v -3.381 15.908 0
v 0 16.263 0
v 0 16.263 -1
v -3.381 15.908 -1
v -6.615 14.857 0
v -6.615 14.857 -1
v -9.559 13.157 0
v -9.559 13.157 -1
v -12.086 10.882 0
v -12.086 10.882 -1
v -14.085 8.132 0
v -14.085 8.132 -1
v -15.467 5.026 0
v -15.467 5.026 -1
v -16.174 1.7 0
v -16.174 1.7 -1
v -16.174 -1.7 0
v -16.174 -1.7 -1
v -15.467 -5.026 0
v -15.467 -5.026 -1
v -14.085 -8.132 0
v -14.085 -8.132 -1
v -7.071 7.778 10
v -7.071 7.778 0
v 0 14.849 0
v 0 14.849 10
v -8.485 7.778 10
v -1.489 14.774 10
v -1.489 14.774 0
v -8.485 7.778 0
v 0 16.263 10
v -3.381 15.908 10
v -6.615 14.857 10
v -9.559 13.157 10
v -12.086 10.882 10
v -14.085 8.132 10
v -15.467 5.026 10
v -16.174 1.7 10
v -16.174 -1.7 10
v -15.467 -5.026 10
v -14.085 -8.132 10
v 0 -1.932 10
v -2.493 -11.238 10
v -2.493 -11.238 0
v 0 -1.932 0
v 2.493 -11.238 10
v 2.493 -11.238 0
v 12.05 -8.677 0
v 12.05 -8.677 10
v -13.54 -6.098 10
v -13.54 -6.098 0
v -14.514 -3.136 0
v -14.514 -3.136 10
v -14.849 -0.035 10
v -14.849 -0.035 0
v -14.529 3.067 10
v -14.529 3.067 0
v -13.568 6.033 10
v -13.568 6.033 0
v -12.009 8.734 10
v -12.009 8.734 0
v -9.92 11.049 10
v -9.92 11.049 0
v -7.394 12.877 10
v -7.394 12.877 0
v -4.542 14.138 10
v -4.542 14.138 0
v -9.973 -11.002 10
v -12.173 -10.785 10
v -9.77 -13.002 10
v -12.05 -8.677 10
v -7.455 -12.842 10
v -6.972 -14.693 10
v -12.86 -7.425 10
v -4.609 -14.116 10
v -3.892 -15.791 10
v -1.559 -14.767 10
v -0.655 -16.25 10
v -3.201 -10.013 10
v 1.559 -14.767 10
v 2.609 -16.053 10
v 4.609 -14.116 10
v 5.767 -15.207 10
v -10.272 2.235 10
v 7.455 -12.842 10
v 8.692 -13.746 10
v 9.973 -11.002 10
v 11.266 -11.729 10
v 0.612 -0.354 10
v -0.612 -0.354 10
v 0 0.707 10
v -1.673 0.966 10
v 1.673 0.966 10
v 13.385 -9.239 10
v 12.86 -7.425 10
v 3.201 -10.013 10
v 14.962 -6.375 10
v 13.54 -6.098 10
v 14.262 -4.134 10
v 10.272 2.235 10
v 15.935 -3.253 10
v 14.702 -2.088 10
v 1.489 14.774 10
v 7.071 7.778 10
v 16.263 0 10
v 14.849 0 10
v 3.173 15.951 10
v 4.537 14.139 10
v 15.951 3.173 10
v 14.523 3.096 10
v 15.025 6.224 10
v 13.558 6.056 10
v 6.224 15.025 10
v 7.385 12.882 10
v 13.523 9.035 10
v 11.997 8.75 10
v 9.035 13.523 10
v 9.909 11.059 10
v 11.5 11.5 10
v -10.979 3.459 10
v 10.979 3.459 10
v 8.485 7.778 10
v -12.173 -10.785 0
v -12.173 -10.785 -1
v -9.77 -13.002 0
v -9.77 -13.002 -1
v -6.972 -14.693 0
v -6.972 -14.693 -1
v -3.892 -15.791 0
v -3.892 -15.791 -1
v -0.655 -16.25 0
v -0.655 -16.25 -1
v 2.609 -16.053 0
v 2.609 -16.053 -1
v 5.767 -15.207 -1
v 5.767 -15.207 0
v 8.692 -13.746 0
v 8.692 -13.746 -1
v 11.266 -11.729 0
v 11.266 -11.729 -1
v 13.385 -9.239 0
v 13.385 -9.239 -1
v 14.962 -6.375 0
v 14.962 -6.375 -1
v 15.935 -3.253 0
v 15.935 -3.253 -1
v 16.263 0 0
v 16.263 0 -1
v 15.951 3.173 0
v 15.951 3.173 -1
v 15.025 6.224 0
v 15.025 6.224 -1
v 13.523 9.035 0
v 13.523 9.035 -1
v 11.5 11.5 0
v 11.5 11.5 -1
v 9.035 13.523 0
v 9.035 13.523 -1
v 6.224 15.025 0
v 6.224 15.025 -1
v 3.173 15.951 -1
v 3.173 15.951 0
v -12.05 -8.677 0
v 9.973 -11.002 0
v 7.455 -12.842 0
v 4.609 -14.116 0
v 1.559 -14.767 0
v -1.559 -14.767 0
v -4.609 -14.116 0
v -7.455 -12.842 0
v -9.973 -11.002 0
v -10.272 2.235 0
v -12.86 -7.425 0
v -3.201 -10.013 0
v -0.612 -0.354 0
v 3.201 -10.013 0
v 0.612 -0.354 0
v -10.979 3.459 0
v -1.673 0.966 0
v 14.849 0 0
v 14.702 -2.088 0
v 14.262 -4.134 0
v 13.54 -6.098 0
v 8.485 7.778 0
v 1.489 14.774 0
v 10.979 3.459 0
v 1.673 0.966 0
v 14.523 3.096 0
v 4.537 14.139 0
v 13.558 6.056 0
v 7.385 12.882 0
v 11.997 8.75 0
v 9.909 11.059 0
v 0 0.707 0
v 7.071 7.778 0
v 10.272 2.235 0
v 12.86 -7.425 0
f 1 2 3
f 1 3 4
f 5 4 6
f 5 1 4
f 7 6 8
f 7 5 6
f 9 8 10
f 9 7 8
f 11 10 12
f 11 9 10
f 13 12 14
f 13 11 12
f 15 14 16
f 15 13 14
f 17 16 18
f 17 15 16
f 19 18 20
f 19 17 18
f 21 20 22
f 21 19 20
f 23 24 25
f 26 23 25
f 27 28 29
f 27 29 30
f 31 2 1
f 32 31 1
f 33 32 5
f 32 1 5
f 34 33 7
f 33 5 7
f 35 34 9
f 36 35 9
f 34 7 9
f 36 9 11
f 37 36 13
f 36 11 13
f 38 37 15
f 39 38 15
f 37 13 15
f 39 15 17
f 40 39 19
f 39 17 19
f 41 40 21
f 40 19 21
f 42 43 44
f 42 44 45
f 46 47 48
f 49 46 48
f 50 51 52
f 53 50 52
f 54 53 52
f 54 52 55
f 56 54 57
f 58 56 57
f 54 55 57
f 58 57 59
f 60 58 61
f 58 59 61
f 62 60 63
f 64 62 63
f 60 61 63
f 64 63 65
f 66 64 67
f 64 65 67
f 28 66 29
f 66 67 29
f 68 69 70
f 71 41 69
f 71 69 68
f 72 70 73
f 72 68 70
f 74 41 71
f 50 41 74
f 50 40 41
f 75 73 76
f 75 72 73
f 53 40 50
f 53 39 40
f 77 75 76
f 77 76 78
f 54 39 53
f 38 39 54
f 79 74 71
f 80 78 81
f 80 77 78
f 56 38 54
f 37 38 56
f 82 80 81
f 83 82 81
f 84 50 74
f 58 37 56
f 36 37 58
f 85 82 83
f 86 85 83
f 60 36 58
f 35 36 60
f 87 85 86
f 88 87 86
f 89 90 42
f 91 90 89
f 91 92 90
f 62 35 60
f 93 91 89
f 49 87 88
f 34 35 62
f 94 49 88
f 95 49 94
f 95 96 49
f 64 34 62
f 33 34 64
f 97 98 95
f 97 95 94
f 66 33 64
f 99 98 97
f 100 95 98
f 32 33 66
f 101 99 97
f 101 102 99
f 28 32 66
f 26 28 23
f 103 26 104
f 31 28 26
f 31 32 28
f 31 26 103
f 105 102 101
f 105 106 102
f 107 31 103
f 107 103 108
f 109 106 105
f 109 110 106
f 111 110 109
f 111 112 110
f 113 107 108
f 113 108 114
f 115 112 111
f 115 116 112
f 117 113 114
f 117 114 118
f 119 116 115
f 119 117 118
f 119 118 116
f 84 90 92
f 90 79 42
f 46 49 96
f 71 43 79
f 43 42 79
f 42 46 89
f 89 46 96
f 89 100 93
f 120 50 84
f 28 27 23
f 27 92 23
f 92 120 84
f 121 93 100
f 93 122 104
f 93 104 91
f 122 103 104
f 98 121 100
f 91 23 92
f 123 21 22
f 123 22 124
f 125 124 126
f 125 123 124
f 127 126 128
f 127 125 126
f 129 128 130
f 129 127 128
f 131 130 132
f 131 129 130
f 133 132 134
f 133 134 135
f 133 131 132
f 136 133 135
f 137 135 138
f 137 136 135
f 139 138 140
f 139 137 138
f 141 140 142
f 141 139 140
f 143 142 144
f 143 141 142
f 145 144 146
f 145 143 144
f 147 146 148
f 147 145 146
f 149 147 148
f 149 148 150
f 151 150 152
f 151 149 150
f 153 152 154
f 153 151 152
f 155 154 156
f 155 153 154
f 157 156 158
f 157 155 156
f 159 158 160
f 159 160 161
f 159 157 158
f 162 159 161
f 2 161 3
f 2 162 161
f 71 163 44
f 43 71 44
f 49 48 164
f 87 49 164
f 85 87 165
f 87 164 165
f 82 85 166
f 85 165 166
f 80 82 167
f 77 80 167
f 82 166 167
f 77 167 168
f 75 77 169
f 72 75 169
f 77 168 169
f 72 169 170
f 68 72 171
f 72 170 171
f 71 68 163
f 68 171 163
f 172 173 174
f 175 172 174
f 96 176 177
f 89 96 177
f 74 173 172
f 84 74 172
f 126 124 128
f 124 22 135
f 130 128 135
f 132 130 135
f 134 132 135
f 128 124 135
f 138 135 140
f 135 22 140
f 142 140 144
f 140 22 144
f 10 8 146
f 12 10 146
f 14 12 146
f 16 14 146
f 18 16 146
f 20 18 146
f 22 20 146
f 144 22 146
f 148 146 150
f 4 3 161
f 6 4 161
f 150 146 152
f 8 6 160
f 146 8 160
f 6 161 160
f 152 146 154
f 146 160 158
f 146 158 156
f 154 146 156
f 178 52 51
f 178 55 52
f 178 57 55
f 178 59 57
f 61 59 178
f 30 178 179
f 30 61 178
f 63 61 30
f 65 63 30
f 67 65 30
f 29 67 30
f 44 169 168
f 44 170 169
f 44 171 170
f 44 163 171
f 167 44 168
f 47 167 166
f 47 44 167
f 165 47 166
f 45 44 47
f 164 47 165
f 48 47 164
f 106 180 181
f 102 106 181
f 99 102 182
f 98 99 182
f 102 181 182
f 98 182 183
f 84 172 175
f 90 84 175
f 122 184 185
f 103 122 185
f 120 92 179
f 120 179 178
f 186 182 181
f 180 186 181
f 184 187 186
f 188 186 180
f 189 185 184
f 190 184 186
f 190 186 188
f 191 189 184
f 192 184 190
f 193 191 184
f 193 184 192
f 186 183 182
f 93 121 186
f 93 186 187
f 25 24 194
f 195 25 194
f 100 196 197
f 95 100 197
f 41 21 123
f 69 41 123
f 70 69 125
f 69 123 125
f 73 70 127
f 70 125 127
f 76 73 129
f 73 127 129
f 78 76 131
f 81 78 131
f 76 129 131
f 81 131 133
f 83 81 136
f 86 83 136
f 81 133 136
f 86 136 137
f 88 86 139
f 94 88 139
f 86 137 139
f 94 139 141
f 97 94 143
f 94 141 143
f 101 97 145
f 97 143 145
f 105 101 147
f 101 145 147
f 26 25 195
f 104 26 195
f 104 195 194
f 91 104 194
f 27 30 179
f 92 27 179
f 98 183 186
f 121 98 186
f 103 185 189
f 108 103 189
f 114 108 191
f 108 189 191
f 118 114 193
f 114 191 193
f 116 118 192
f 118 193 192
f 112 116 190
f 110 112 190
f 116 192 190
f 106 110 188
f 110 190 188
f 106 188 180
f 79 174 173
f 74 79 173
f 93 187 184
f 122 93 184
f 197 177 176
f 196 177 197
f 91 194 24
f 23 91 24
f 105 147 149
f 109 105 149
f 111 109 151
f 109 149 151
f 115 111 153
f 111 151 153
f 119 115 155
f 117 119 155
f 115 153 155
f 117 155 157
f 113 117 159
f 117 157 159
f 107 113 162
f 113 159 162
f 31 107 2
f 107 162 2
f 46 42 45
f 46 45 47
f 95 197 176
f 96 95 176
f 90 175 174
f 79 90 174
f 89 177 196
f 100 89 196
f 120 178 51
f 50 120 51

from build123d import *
from build123d import SkipClean  # not in build123d's __all__

# Parameters (mm, degrees)
F1_DEPTH = 1
F2_DEPTH = 10


with BuildPart() as f1:
    # F0 (on Top) → F1 (new body)
    with BuildSketch(Plane.XY):
        with BuildLine():
            Line((10.9787374798, 3.4593819318), (1.6730326075, 0.9659258263))
            Line((1.6730326075, 0.9659258263), (0.4482877361, -0.2588190451))
            Line((0.4482877361, -0.2588190451), (0, -1.9318516526))
            Line((0, -1.9318516526), (2.4934561055, -11.2375565249))
            Line((2.4934561055, -11.2375565249), (12.0504683321, -8.6767628167))
            ThreePointArc((12.0504683321, -8.6767628167), (12.4708698642, -8.0608563335), (12.8598211496, -7.4246212025))
            ThreePointArc((12.8598211496, -7.4246212025), (13.2163412932, -6.769661943), (13.5395311879, -6.0976302947))
            Line((13.5395311879, -6.0976302947), (10.9787374798, 3.4593819318))
        make_face()
        Polygon((10.2716306986, 2.2346370604), (12.8598211496, -7.4246212025), (3.2005628867, -10.0128116535), (0.6123724357, -0.3535533906), align=None, mode=Mode.SUBTRACT)
        with BuildLine():
            ThreePointArc((1.4890628559, 14.7743931114), (0.7454714289, 14.8305182765), (0, 14.8492424049))
            ThreePointArc((0, 14.8492424049), (-0.7454714289, 14.8305182765), (-1.4890628559, 14.7743931114))
            Line((-1.4890628559, 14.7743931114), (-8.4852813742, 7.7781745931))
            Line((-8.4852813742, 7.7781745931), (-1.6730326075, 0.9659258263))
            Line((-1.6730326075, 0.9659258263), (0, 0.5176380902))
            Line((0, 0.5176380902), (1.6730326075, 0.9659258263))
            Line((1.6730326075, 0.9659258263), (8.4852813742, 7.7781745931))
            Line((8.4852813742, 7.7781745931), (1.4890628559, 14.7743931114))
        make_face()
        Polygon((-7.0710678119, 7.7781745931), (0, 14.8492424049), (7.0710678119, 7.7781745931), (0, 0.7071067812), align=None, mode=Mode.SUBTRACT)
        with BuildLine():
            Line((-10.9787374798, 3.4593819318), (-13.5395311879, -6.0976302947))
            ThreePointArc((-13.5395311879, -6.0976302947), (-13.2163412932, -6.769661943), (-12.8598211496, -7.4246212025))
            ThreePointArc((-12.8598211496, -7.4246212025), (-12.4708698642, -8.0608563335), (-12.0504683321, -8.6767628167))
            Line((-12.0504683321, -8.6767628167), (-2.4934561055, -11.2375565249))
            Line((-2.4934561055, -11.2375565249), (0, -1.9318516526))
            Line((0, -1.9318516526), (-0.4482877361, -0.2588190451))
            Line((-0.4482877361, -0.2588190451), (-1.6730326075, 0.9659258263))
            Line((-1.6730326075, 0.9659258263), (-10.9787374798, 3.4593819318))
        make_face()
        Polygon((-3.2005628867, -10.0128116535), (-12.8598211496, -7.4246212025), (-10.2716306986, 2.2346370604), (-0.6123724357, -0.3535533906), align=None, mode=Mode.SUBTRACT)
        Polygon((-10.2716306986, 2.2346370604), (-12.8598211496, -7.4246212025), (-3.2005628867, -10.0128116535), (-0.6123724357, -0.3535533906), align=None)
        Polygon((3.2005628867, -10.0128116535), (12.8598211496, -7.4246212025), (10.2716306986, 2.2346370604), (0.6123724357, -0.3535533906), align=None)
        Polygon((7.0710678119, 7.7781745931), (0, 14.8492424049), (-7.0710678119, 7.7781745931), (0, 0.7071067812), align=None)
        with BuildLine():
            Line((-8.4852813742, 7.7781745931), (-1.4890628559, 14.7743931114))
            ThreePointArc((-1.4890628559, 14.7743931114), (-12.8598211496, 7.4246212025), (-13.5395311879, -6.0976302947))
            Line((-13.5395311879, -6.0976302947), (-10.9787374798, 3.4593819318))
            Line((-10.9787374798, 3.4593819318), (-1.6730326075, 0.9659258263))
            Line((-1.6730326075, 0.9659258263), (-8.4852813742, 7.7781745931))
        make_face()
        with BuildLine():
            ThreePointArc((14.8492424049, 0), (11.0138879444, 9.9596321392), (1.4890628559, 14.7743931114))
            Line((1.4890628559, 14.7743931114), (8.4852813742, 7.7781745931))
            Line((8.4852813742, 7.7781745931), (1.6730326075, 0.9659258263))
            Line((1.6730326075, 0.9659258263), (10.9787374798, 3.4593819318))
            Line((10.9787374798, 3.4593819318), (13.5395311879, -6.0976302947))
            ThreePointArc((13.5395311879, -6.0976302947), (14.5181228239, -3.1183504727), (14.8492424049, 0))
        make_face()
        with BuildLine():
            Line((-2.4934561055, -11.2375565249), (-12.0504683321, -8.6767628167))
            ThreePointArc((-12.0504683321, -8.6767628167), (0, -14.8492424049), (12.0504683321, -8.6767628167))
            Line((12.0504683321, -8.6767628167), (2.4934561055, -11.2375565249))
            Line((2.4934561055, -11.2375565249), (0, -1.9318516526))
            Line((0, -1.9318516526), (-2.4934561055, -11.2375565249))
        make_face()
        with BuildLine():
            ThreePointArc((-13.5395311879, -6.0976302947), (-12.8598211496, 7.4246212025), (-1.4890628559, 14.7743931114))
            Line((-1.4890628559, 14.7743931114), (0, 16.2634559673))
            ThreePointArc((0, 16.2634559673), (-14.084566021, 8.1317279836), (-14.084566021, -8.1317279836))
            Line((-14.084566021, -8.1317279836), (-13.5395311879, -6.0976302947))
        make_face()
        with BuildLine():
            Line((0, 16.2634559673), (1.4890628559, 14.7743931114))
            ThreePointArc((1.4890628559, 14.7743931114), (11.0138879444, 9.9596321392), (14.8492424049, 0))
            ThreePointArc((14.8492424049, 0), (14.5181228239, -3.1183504727), (13.5395311879, -6.0976302947))
            Line((13.5395311879, -6.0976302947), (14.084566021, -8.1317279836))
            ThreePointArc((14.084566021, -8.1317279836), (15.7092921435, -4.2092921435), (16.2634559673, 0))
            ThreePointArc((16.2634559673, 0), (11.5, 11.5), (0, 16.2634559673))
        make_face()
        with BuildLine():
            Line((-12.0504683321, -8.6767628167), (-14.084566021, -8.1317279836))
            ThreePointArc((-14.084566021, -8.1317279836), (0, -16.2634559673), (14.084566021, -8.1317279836))
            Line((14.084566021, -8.1317279836), (12.0504683321, -8.6767628167))
            ThreePointArc((12.0504683321, -8.6767628167), (0, -14.8492424049), (-12.0504683321, -8.6767628167))
        make_face()
        with BuildLine():
            ThreePointArc((-1.4890628559, 14.7743931114), (-0.7454714289, 14.8305182765), (0, 14.8492424049))
            ThreePointArc((0, 14.8492424049), (0.7454714289, 14.8305182765), (1.4890628559, 14.7743931114))
            Line((1.4890628559, 14.7743931114), (0, 16.2634559673))
            Line((0, 16.2634559673), (-1.4890628559, 14.7743931114))
        make_face()
        with BuildLine():
            Line((14.084566021, -8.1317279836), (13.5395311879, -6.0976302947))
            ThreePointArc((13.5395311879, -6.0976302947), (13.2163412932, -6.769661943), (12.8598211496, -7.4246212025))
            ThreePointArc((12.8598211496, -7.4246212025), (12.4708698642, -8.0608563335), (12.0504683321, -8.6767628167))
            Line((12.0504683321, -8.6767628167), (14.084566021, -8.1317279836))
        make_face()
        with BuildLine():
            ThreePointArc((-12.8598211496, -7.4246212025), (-13.2163412932, -6.769661943), (-13.5395311879, -6.0976302947))
            Line((-13.5395311879, -6.0976302947), (-14.084566021, -8.1317279836))
            Line((-14.084566021, -8.1317279836), (-12.0504683321, -8.6767628167))
            ThreePointArc((-12.0504683321, -8.6767628167), (-12.4708698642, -8.0608563335), (-12.8598211496, -7.4246212025))
        make_face()
        Polygon((0, -0.7071067812), (0.4482877361, -0.2588190451), (0.6123724357, 0.3535533906), (0, 0.5176380902), (-0.6123724357, 0.3535533906), (-0.4482877361, -0.2588190451), align=None)
        Polygon((0, -1.9318516526), (0.4482877361, -0.2588190451), (0, -0.7071067812), (-0.4482877361, -0.2588190451), align=None)
        Polygon((0, 0.5176380902), (-1.6730326075, 0.9659258263), (-0.4482877361, -0.2588190451), (-0.6123724357, 0.3535533906), align=None)
        Polygon((0.4482877361, -0.2588190451), (1.6730326075, 0.9659258263), (0, 0.5176380902), (0.6123724357, 0.3535533906), align=None)
    extrude(amount=-F1_DEPTH)

    # F0 (on Top) → F2 (join)
    with BuildSketch(Plane.XY):
        with BuildLine():
            Line((10.9787374798, 3.4593819318), (1.6730326075, 0.9659258263))
            Line((1.6730326075, 0.9659258263), (0.4482877361, -0.2588190451))
            Line((0.4482877361, -0.2588190451), (0, -1.9318516526))
            Line((0, -1.9318516526), (2.4934561055, -11.2375565249))
            Line((2.4934561055, -11.2375565249), (12.0504683321, -8.6767628167))
            ThreePointArc((12.0504683321, -8.6767628167), (12.4708698642, -8.0608563335), (12.8598211496, -7.4246212025))
            ThreePointArc((12.8598211496, -7.4246212025), (13.2163412932, -6.769661943), (13.5395311879, -6.0976302947))
            Line((13.5395311879, -6.0976302947), (10.9787374798, 3.4593819318))
        make_face()
        Polygon((10.2716306986, 2.2346370604), (12.8598211496, -7.4246212025), (3.2005628867, -10.0128116535), (0.6123724357, -0.3535533906), align=None, mode=Mode.SUBTRACT)
        with BuildLine():
            Line((0, 16.2634559673), (1.4890628559, 14.7743931114))
            ThreePointArc((1.4890628559, 14.7743931114), (11.0138879444, 9.9596321392), (14.8492424049, 0))
            ThreePointArc((14.8492424049, 0), (14.5181228239, -3.1183504727), (13.5395311879, -6.0976302947))
            Line((13.5395311879, -6.0976302947), (14.084566021, -8.1317279836))
            ThreePointArc((14.084566021, -8.1317279836), (15.7092921435, -4.2092921435), (16.2634559673, 0))
            ThreePointArc((16.2634559673, 0), (11.5, 11.5), (0, 16.2634559673))
        make_face()
        with BuildLine():
            ThreePointArc((-13.5395311879, -6.0976302947), (-12.8598211496, 7.4246212025), (-1.4890628559, 14.7743931114))
            Line((-1.4890628559, 14.7743931114), (0, 16.2634559673))
            ThreePointArc((0, 16.2634559673), (-14.084566021, 8.1317279836), (-14.084566021, -8.1317279836))
            Line((-14.084566021, -8.1317279836), (-13.5395311879, -6.0976302947))
        make_face()
        with BuildLine():
            ThreePointArc((1.4890628559, 14.7743931114), (0.7454714289, 14.8305182765), (0, 14.8492424049))
            ThreePointArc((0, 14.8492424049), (-0.7454714289, 14.8305182765), (-1.4890628559, 14.7743931114))
            Line((-1.4890628559, 14.7743931114), (-8.4852813742, 7.7781745931))
            Line((-8.4852813742, 7.7781745931), (-1.6730326075, 0.9659258263))
            Line((-1.6730326075, 0.9659258263), (0, 0.5176380902))
            Line((0, 0.5176380902), (1.6730326075, 0.9659258263))
            Line((1.6730326075, 0.9659258263), (8.4852813742, 7.7781745931))
            Line((8.4852813742, 7.7781745931), (1.4890628559, 14.7743931114))
        make_face()
        Polygon((-7.0710678119, 7.7781745931), (0, 14.8492424049), (7.0710678119, 7.7781745931), (0, 0.7071067812), align=None, mode=Mode.SUBTRACT)
        with BuildLine():
            Line((-12.0504683321, -8.6767628167), (-14.084566021, -8.1317279836))
            ThreePointArc((-14.084566021, -8.1317279836), (0, -16.2634559673), (14.084566021, -8.1317279836))
            Line((14.084566021, -8.1317279836), (12.0504683321, -8.6767628167))
            ThreePointArc((12.0504683321, -8.6767628167), (0, -14.8492424049), (-12.0504683321, -8.6767628167))
        make_face()
        with BuildLine():
            Line((-10.9787374798, 3.4593819318), (-13.5395311879, -6.0976302947))
            ThreePointArc((-13.5395311879, -6.0976302947), (-13.2163412932, -6.769661943), (-12.8598211496, -7.4246212025))
            ThreePointArc((-12.8598211496, -7.4246212025), (-12.4708698642, -8.0608563335), (-12.0504683321, -8.6767628167))
            Line((-12.0504683321, -8.6767628167), (-2.4934561055, -11.2375565249))
            Line((-2.4934561055, -11.2375565249), (0, -1.9318516526))
            Line((0, -1.9318516526), (-0.4482877361, -0.2588190451))
            Line((-0.4482877361, -0.2588190451), (-1.6730326075, 0.9659258263))
            Line((-1.6730326075, 0.9659258263), (-10.9787374798, 3.4593819318))
        make_face()
        Polygon((-3.2005628867, -10.0128116535), (-12.8598211496, -7.4246212025), (-10.2716306986, 2.2346370604), (-0.6123724357, -0.3535533906), align=None, mode=Mode.SUBTRACT)
        Polygon((0, -1.9318516526), (0.4482877361, -0.2588190451), (0, -0.7071067812), (-0.4482877361, -0.2588190451), align=None)
        with BuildLine():
            ThreePointArc((-1.4890628559, 14.7743931114), (-0.7454714289, 14.8305182765), (0, 14.8492424049))
            ThreePointArc((0, 14.8492424049), (0.7454714289, 14.8305182765), (1.4890628559, 14.7743931114))
            Line((1.4890628559, 14.7743931114), (0, 16.2634559673))
            Line((0, 16.2634559673), (-1.4890628559, 14.7743931114))
        make_face()
        Polygon((0, 0.5176380902), (-1.6730326075, 0.9659258263), (-0.4482877361, -0.2588190451), (-0.6123724357, 0.3535533906), align=None)
        with BuildLine():
            ThreePointArc((-12.8598211496, -7.4246212025), (-13.2163412932, -6.769661943), (-13.5395311879, -6.0976302947))
            Line((-13.5395311879, -6.0976302947), (-14.084566021, -8.1317279836))
            Line((-14.084566021, -8.1317279836), (-12.0504683321, -8.6767628167))
            ThreePointArc((-12.0504683321, -8.6767628167), (-12.4708698642, -8.0608563335), (-12.8598211496, -7.4246212025))
        make_face()
        with BuildLine():
            Line((14.084566021, -8.1317279836), (13.5395311879, -6.0976302947))
            ThreePointArc((13.5395311879, -6.0976302947), (13.2163412932, -6.769661943), (12.8598211496, -7.4246212025))
            ThreePointArc((12.8598211496, -7.4246212025), (12.4708698642, -8.0608563335), (12.0504683321, -8.6767628167))
            Line((12.0504683321, -8.6767628167), (14.084566021, -8.1317279836))
        make_face()
        Polygon((0.4482877361, -0.2588190451), (1.6730326075, 0.9659258263), (0, 0.5176380902), (0.6123724357, 0.3535533906), align=None)
        Polygon((0, -0.7071067812), (0.4482877361, -0.2588190451), (0.6123724357, 0.3535533906), (0, 0.5176380902), (-0.6123724357, 0.3535533906), (-0.4482877361, -0.2588190451), align=None)
    with SkipClean():  # cleaning this boolean's faces spoils the solid; the shape is the same uncleaned
        extrude(amount=F2_DEPTH)


solid = f1.part
